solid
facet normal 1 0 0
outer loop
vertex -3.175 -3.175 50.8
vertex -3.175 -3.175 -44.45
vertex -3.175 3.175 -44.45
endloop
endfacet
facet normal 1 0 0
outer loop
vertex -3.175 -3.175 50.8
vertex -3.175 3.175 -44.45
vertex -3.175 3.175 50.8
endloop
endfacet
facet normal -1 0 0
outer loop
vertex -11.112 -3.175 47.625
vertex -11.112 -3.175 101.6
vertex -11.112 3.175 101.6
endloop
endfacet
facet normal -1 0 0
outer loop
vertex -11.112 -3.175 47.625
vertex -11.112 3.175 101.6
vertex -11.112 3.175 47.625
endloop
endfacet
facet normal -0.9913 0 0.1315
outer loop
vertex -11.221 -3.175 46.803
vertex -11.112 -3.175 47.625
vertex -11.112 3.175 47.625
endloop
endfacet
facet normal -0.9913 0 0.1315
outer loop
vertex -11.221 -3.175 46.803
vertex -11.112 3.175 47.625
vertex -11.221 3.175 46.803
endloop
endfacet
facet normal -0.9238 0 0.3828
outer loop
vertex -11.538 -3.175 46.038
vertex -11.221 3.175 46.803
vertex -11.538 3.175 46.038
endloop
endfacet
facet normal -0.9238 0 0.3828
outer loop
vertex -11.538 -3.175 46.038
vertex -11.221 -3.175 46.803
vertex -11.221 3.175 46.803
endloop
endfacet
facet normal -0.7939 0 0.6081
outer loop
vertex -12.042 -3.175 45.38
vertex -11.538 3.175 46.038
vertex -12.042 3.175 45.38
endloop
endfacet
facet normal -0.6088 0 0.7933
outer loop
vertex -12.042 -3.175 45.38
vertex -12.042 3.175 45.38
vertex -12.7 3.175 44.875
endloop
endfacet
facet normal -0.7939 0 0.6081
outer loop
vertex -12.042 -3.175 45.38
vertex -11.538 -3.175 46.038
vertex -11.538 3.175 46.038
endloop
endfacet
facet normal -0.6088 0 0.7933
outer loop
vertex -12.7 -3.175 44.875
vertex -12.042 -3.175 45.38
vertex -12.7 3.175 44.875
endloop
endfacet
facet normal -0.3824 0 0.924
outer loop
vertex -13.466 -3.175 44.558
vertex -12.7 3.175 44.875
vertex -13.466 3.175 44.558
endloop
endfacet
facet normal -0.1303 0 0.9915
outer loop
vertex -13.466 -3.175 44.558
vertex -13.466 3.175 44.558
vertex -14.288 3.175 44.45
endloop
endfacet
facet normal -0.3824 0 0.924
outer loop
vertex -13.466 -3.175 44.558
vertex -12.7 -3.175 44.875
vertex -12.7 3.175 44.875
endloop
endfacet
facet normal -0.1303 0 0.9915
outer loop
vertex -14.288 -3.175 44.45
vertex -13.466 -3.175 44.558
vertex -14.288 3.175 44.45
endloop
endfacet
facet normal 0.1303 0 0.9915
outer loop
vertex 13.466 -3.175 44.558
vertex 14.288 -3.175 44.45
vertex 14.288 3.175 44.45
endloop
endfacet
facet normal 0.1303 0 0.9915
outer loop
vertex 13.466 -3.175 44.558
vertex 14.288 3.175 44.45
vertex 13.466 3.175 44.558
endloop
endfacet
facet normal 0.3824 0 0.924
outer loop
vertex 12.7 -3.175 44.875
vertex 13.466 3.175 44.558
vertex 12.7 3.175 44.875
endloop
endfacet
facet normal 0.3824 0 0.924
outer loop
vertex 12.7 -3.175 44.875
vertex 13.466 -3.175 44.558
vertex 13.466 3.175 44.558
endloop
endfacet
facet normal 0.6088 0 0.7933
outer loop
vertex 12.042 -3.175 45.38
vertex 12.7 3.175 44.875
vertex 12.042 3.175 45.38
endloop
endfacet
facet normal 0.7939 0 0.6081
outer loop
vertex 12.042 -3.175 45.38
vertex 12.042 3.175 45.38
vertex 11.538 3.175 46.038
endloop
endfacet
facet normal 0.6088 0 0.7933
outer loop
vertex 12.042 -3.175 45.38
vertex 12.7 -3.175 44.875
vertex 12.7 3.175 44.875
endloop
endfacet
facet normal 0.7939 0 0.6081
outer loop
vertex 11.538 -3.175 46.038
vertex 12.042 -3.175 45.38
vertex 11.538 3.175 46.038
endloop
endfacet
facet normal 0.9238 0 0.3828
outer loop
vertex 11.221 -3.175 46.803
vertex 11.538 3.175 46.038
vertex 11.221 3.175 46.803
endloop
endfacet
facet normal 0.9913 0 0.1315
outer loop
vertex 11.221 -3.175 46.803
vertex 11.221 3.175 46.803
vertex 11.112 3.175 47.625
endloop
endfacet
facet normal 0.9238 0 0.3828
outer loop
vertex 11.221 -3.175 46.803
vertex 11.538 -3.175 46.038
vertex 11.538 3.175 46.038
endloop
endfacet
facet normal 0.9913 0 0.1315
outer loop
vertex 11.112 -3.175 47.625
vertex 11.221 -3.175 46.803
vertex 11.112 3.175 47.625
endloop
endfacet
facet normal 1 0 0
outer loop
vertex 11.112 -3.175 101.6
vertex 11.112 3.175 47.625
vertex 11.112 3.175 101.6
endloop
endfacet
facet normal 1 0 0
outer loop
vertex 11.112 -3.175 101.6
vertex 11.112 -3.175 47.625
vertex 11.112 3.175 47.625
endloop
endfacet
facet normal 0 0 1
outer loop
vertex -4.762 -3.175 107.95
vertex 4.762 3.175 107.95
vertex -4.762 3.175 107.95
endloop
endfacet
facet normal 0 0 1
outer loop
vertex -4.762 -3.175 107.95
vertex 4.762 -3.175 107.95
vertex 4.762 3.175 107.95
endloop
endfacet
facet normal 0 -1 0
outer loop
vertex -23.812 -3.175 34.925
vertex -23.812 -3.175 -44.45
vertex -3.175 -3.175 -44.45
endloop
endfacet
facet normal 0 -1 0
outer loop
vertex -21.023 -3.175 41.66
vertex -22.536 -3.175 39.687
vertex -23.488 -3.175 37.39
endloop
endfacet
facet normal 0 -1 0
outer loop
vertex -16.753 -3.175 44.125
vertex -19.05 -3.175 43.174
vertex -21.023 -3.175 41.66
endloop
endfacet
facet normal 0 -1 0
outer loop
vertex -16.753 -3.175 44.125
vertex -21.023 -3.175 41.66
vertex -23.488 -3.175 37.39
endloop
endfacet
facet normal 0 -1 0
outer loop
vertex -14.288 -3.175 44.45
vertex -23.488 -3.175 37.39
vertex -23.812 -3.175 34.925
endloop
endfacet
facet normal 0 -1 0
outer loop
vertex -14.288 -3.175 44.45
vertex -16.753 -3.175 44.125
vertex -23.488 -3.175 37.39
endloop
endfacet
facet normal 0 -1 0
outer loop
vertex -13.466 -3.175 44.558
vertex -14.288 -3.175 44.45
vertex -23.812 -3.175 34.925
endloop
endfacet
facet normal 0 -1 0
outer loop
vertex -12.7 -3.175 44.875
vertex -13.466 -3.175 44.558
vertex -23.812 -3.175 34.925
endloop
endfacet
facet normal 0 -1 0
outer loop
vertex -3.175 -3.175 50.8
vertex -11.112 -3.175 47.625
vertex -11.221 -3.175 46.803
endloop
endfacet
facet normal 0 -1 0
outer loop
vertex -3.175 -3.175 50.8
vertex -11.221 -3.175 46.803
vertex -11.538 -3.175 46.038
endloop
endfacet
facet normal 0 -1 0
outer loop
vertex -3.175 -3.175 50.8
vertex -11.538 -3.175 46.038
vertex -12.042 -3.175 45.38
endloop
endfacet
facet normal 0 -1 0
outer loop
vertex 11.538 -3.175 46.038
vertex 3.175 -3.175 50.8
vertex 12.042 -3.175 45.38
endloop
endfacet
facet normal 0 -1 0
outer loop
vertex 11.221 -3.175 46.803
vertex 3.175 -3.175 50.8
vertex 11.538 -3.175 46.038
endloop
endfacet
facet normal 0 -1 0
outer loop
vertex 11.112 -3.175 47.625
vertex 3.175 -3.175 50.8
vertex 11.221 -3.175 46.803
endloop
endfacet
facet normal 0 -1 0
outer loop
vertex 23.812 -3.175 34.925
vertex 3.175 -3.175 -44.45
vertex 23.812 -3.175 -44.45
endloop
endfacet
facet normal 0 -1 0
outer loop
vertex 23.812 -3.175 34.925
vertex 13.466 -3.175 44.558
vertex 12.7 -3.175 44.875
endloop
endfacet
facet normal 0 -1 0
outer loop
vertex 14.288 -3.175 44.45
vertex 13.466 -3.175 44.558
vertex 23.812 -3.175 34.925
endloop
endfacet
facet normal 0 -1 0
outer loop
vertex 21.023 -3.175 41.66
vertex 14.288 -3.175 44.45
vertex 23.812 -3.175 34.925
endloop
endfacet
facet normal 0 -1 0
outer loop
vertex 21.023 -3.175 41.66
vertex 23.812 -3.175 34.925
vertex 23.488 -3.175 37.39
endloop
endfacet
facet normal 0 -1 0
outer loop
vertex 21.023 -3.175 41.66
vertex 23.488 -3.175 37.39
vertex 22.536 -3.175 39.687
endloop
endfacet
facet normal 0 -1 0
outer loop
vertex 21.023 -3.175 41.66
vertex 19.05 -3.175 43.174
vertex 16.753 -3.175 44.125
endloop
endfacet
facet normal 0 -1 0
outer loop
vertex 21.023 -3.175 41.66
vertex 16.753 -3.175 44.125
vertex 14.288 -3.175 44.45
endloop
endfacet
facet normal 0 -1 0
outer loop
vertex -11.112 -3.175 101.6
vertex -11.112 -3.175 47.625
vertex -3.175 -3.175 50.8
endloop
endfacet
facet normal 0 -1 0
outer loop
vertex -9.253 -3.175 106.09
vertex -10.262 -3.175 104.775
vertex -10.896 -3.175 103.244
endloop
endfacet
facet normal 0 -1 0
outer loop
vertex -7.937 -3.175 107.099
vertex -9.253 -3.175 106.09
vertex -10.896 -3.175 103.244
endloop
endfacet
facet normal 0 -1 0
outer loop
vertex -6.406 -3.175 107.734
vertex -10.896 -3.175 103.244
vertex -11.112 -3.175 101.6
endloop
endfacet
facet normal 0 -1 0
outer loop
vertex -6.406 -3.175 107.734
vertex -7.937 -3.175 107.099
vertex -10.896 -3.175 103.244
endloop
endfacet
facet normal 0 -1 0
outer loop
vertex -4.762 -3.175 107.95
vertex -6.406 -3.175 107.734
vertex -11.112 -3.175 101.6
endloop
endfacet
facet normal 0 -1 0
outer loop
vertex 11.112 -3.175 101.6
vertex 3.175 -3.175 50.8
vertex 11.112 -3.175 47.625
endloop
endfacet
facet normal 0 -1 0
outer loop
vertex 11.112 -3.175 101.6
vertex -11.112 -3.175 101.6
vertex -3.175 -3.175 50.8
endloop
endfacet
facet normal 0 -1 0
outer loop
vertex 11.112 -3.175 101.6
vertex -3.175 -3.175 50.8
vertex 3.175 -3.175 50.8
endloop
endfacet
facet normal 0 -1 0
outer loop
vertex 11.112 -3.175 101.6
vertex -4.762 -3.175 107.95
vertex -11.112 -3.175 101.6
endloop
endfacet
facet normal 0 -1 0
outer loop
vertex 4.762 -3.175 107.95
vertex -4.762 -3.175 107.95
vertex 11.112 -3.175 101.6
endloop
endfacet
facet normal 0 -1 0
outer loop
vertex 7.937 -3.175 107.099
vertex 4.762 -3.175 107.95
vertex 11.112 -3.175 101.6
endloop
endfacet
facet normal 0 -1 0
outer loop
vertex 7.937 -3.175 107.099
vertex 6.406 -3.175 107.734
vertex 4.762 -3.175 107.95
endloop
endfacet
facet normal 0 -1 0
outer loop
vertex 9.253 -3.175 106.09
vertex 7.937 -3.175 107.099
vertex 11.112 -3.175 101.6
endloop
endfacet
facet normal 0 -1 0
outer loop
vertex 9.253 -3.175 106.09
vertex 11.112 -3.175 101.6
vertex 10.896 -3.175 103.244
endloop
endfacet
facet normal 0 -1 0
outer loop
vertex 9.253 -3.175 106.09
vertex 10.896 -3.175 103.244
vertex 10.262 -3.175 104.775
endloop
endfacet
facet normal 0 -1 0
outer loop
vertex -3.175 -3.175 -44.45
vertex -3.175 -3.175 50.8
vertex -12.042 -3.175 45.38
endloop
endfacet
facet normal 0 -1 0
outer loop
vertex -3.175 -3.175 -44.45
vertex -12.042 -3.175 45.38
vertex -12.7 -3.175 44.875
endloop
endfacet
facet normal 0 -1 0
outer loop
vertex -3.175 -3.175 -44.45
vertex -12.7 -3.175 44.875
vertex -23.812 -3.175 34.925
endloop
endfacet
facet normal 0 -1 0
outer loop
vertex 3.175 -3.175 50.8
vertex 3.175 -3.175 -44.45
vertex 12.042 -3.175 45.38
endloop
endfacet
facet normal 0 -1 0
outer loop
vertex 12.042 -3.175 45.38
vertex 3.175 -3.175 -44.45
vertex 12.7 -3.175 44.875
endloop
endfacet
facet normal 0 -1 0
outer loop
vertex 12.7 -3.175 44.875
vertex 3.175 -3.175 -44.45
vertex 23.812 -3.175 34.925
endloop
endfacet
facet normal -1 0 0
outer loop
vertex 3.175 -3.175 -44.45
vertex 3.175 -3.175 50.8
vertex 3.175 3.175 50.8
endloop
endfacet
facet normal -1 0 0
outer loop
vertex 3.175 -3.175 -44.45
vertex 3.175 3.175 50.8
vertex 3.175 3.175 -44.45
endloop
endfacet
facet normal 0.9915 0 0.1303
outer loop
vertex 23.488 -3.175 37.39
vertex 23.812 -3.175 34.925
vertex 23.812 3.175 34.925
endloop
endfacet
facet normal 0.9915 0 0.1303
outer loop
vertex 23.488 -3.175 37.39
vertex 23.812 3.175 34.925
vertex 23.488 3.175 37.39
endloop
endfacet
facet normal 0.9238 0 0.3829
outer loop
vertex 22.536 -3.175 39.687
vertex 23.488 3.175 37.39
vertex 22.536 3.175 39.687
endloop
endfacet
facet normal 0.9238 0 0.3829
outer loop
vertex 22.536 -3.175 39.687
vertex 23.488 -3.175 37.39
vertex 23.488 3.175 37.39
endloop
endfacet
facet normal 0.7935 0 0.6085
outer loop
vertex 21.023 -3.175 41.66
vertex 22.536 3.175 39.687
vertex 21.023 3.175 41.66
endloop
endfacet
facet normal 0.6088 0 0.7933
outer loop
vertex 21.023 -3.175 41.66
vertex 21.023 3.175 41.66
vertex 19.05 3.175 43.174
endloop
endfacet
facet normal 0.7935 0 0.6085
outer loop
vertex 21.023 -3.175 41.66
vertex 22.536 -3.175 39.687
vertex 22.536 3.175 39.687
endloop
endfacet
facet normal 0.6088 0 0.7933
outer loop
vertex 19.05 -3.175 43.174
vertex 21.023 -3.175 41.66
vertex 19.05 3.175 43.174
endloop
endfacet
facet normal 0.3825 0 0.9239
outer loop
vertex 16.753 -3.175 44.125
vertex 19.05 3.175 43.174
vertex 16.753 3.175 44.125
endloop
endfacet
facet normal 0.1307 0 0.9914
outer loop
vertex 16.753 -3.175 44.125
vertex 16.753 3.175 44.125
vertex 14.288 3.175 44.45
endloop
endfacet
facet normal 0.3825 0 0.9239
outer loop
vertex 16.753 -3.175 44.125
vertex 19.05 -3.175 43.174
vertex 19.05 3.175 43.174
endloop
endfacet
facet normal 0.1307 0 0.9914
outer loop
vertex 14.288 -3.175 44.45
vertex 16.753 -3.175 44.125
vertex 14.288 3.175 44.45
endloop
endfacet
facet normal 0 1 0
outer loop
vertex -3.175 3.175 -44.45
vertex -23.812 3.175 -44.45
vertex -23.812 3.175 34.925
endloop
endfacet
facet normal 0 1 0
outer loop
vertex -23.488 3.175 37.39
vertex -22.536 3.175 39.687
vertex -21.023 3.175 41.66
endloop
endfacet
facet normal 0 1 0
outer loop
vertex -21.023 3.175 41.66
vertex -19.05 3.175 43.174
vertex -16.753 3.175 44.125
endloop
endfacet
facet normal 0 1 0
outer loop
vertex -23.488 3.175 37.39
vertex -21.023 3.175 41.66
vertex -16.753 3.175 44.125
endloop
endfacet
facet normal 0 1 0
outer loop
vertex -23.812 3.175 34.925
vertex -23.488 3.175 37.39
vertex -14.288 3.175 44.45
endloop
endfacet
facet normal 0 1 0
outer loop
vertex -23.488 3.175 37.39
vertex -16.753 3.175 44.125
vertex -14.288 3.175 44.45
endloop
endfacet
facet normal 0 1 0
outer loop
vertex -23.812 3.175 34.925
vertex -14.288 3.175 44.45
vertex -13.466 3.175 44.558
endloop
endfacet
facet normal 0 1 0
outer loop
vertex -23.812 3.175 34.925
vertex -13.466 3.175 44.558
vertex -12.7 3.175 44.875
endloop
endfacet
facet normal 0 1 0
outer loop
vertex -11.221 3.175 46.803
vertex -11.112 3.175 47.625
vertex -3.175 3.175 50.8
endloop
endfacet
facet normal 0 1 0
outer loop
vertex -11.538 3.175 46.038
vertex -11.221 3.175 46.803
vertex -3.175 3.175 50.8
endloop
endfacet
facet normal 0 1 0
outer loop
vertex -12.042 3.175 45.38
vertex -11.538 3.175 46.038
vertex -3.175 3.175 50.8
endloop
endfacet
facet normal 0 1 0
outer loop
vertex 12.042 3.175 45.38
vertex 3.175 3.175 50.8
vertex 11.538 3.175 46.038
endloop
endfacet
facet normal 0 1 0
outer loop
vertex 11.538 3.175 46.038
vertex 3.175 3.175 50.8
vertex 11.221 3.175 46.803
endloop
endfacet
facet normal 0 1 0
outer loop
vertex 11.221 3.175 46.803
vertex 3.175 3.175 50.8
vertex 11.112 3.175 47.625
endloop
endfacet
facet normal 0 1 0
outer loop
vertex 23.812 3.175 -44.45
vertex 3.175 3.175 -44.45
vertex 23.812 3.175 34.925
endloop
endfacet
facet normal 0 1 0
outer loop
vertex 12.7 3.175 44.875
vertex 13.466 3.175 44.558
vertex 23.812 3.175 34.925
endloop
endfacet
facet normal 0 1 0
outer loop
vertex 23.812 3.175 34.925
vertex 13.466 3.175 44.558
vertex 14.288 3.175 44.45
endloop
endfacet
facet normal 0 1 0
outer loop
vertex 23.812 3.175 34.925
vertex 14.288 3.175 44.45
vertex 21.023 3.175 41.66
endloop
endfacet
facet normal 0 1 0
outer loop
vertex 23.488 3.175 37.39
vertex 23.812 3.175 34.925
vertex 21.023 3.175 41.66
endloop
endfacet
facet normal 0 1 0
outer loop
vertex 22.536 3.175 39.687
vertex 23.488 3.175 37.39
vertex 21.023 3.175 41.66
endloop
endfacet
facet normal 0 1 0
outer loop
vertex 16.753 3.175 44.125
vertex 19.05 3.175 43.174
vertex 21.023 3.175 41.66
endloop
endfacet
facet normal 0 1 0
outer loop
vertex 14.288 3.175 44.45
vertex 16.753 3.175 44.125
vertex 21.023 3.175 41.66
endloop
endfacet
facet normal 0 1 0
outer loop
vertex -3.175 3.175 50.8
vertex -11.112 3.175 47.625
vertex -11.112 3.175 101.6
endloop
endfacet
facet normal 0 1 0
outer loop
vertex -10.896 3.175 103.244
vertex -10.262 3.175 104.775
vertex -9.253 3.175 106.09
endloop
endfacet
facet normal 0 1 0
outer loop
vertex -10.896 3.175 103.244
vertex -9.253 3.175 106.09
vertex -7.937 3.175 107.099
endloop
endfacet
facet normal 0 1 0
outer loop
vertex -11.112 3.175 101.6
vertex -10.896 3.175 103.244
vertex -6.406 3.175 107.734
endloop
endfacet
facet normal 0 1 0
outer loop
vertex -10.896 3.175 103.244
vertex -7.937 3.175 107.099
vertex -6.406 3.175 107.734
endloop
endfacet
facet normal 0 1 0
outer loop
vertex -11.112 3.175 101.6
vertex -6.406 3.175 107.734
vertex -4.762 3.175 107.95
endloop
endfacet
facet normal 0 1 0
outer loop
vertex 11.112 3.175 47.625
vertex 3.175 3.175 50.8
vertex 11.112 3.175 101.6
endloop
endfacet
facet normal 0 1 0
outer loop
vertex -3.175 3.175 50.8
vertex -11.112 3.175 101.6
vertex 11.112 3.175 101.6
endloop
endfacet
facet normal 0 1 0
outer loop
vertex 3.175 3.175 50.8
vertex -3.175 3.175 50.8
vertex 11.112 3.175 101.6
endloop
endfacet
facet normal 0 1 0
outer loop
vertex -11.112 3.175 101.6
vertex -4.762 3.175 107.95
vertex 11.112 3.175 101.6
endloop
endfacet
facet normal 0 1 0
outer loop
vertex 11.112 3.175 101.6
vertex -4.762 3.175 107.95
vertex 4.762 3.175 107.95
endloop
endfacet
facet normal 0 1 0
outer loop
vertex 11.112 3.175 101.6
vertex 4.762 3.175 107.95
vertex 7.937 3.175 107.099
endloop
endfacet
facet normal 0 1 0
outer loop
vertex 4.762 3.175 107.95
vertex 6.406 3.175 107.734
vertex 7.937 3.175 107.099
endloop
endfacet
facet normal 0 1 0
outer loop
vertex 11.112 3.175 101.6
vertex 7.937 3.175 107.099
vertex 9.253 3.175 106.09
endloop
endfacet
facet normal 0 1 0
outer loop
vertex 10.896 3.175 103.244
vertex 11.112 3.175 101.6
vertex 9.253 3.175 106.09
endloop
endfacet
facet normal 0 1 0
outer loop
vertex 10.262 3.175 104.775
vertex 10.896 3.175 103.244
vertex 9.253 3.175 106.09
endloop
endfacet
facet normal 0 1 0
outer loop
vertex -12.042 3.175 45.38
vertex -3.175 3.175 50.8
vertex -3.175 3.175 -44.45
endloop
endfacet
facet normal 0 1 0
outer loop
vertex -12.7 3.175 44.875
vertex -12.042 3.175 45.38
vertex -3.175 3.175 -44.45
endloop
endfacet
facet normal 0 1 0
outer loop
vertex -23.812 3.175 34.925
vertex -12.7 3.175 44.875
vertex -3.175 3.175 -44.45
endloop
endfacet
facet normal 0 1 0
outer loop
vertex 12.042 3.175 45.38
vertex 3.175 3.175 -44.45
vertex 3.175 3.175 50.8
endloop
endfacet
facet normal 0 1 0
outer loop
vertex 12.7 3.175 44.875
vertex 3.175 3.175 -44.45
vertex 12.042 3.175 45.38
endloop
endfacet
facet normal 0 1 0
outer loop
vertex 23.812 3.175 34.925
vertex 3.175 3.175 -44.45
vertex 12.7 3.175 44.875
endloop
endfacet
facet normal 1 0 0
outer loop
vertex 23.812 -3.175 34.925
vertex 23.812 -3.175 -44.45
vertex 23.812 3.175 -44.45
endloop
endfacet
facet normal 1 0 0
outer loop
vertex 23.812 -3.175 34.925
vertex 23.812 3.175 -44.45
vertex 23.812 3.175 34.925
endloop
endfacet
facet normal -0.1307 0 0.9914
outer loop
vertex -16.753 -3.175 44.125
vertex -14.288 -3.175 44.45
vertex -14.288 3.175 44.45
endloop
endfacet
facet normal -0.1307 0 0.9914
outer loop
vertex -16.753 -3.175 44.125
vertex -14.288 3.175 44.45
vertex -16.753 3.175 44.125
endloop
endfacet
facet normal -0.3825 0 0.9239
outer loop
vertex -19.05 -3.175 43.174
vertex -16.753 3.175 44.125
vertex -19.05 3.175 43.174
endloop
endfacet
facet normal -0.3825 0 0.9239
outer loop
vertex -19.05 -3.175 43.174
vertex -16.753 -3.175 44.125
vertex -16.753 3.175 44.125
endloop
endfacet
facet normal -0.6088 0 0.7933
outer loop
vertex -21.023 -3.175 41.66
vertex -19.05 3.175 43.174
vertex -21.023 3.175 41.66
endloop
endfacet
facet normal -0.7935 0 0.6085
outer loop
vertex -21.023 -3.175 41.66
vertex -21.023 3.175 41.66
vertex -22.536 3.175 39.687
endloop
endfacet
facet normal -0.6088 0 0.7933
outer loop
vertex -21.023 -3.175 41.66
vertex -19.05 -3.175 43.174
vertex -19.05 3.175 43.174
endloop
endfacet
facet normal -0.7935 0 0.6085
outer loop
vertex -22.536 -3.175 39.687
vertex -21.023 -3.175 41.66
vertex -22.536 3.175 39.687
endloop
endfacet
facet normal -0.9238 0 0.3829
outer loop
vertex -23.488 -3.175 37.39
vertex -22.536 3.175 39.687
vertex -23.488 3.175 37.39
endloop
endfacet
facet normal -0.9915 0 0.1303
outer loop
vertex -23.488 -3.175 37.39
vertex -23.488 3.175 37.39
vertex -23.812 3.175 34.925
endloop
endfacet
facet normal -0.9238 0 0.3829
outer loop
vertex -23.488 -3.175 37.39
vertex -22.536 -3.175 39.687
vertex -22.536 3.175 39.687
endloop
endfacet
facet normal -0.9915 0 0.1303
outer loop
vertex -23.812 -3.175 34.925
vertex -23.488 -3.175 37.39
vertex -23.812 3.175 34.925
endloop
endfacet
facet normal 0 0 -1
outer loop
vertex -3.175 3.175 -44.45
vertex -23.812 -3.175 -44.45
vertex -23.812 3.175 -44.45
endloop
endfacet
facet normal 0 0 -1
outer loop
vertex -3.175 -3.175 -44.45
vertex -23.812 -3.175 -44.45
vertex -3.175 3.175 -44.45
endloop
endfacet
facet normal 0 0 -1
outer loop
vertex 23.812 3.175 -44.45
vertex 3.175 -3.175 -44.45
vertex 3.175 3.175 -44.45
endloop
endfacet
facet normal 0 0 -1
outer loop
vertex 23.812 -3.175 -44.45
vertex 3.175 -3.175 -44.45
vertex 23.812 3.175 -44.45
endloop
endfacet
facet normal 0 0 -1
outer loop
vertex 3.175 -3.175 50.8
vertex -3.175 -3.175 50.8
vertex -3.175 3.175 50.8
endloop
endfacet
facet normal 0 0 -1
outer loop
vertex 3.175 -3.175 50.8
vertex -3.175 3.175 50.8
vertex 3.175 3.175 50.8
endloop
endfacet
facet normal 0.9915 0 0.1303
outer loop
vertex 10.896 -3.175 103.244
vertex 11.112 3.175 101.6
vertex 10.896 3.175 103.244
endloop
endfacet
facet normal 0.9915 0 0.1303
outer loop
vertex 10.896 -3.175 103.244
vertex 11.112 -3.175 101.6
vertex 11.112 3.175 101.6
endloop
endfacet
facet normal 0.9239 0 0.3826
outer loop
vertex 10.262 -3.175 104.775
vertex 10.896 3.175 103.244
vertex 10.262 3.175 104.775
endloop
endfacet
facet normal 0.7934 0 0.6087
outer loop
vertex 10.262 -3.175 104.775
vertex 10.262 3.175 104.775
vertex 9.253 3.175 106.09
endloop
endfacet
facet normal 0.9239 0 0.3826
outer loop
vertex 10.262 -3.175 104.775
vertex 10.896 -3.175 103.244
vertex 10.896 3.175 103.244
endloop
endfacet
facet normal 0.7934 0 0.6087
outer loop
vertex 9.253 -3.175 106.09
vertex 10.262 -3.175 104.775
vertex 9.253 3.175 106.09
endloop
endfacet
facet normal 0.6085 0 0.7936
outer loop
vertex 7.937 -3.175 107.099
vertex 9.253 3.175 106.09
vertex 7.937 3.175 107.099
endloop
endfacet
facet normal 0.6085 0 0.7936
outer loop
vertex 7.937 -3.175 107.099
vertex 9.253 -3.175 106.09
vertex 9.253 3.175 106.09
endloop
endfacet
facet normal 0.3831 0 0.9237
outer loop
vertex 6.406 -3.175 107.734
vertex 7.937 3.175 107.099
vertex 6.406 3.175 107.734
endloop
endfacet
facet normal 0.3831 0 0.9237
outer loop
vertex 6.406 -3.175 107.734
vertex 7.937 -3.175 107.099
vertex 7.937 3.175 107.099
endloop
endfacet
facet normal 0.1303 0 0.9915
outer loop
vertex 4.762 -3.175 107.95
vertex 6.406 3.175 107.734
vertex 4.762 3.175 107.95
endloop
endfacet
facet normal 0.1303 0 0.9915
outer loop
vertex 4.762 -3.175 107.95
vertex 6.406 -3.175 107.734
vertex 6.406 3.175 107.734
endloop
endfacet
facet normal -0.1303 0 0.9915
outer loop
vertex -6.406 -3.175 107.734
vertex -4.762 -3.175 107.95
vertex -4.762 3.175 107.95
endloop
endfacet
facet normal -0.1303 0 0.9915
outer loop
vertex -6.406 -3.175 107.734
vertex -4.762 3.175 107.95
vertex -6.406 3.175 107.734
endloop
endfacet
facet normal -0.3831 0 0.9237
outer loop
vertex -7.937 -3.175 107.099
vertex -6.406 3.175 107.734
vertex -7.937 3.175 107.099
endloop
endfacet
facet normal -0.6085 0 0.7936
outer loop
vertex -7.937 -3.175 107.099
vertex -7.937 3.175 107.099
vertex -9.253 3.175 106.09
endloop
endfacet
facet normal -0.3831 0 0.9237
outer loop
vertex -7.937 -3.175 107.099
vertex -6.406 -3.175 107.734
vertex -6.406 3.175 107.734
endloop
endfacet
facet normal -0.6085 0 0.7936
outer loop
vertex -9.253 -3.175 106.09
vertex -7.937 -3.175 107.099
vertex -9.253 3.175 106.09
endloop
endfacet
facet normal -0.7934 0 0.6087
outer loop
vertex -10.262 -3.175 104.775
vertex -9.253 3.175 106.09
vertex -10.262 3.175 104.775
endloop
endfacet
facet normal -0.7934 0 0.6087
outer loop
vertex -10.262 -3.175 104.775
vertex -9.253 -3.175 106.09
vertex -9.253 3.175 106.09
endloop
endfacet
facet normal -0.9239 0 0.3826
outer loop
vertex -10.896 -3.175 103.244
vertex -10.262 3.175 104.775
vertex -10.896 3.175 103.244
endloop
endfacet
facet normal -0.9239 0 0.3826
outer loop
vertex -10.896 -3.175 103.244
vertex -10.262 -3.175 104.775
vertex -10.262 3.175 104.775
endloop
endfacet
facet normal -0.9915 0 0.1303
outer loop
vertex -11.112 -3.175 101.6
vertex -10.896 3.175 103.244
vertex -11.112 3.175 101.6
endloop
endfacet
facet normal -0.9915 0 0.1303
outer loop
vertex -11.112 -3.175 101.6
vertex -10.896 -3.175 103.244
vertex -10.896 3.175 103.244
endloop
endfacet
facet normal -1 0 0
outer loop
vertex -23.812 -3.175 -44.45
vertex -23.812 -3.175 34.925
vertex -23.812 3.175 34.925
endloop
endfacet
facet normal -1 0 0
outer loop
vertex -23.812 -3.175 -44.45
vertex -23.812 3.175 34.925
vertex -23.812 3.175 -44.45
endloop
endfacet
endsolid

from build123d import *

# Parameters (mm, degrees)
F1_DEPTH = 3.175


with BuildPart() as f1:
    # F0 (on Front) → F1 (new body, symmetric)
    with BuildSketch(Plane.XZ):
        with BuildLine():
            Line((4.7625, 107.95), (-4.7625, 107.95))
            ThreePointArc((-4.7625, 107.95), (-9.252628, 106.090128), (-11.1125, 101.6))
            Line((-11.1125, 101.6), (-11.1125, 47.625))
            ThreePointArc((-11.1125, 47.625), (-12.042436, 45.379936), (-14.2875, 44.45))
            ThreePointArc((-14.2875, 44.45), (-21.022692, 41.660192), (-23.8125, 34.925))
            Line((-23.8125, 34.925), (-23.8125, -44.45))
            Line((-23.8125, -44.45), (-3.175, -44.45))
            Line((-3.175, -44.45), (-3.175, 50.8))
            Line((-3.175, 50.8), (3.175, 50.8))
            Line((3.175, 50.8), (3.175, -44.45))
            Line((3.175, -44.45), (23.8125, -44.45))
            Line((23.8125, -44.45), (23.8125, 34.925))
            ThreePointArc((23.8125, 34.925), (21.022692, 41.660192), (14.2875, 44.45))
            ThreePointArc((14.2875, 44.45), (12.042436, 45.379936), (11.1125, 47.625))
            Line((11.1125, 47.625), (11.1125, 101.6))
            ThreePointArc((11.1125, 101.6), (9.252628, 106.090128), (4.7625, 107.95))
        make_face()
    extrude(amount=F1_DEPTH, both=True)


solid = f1.part
